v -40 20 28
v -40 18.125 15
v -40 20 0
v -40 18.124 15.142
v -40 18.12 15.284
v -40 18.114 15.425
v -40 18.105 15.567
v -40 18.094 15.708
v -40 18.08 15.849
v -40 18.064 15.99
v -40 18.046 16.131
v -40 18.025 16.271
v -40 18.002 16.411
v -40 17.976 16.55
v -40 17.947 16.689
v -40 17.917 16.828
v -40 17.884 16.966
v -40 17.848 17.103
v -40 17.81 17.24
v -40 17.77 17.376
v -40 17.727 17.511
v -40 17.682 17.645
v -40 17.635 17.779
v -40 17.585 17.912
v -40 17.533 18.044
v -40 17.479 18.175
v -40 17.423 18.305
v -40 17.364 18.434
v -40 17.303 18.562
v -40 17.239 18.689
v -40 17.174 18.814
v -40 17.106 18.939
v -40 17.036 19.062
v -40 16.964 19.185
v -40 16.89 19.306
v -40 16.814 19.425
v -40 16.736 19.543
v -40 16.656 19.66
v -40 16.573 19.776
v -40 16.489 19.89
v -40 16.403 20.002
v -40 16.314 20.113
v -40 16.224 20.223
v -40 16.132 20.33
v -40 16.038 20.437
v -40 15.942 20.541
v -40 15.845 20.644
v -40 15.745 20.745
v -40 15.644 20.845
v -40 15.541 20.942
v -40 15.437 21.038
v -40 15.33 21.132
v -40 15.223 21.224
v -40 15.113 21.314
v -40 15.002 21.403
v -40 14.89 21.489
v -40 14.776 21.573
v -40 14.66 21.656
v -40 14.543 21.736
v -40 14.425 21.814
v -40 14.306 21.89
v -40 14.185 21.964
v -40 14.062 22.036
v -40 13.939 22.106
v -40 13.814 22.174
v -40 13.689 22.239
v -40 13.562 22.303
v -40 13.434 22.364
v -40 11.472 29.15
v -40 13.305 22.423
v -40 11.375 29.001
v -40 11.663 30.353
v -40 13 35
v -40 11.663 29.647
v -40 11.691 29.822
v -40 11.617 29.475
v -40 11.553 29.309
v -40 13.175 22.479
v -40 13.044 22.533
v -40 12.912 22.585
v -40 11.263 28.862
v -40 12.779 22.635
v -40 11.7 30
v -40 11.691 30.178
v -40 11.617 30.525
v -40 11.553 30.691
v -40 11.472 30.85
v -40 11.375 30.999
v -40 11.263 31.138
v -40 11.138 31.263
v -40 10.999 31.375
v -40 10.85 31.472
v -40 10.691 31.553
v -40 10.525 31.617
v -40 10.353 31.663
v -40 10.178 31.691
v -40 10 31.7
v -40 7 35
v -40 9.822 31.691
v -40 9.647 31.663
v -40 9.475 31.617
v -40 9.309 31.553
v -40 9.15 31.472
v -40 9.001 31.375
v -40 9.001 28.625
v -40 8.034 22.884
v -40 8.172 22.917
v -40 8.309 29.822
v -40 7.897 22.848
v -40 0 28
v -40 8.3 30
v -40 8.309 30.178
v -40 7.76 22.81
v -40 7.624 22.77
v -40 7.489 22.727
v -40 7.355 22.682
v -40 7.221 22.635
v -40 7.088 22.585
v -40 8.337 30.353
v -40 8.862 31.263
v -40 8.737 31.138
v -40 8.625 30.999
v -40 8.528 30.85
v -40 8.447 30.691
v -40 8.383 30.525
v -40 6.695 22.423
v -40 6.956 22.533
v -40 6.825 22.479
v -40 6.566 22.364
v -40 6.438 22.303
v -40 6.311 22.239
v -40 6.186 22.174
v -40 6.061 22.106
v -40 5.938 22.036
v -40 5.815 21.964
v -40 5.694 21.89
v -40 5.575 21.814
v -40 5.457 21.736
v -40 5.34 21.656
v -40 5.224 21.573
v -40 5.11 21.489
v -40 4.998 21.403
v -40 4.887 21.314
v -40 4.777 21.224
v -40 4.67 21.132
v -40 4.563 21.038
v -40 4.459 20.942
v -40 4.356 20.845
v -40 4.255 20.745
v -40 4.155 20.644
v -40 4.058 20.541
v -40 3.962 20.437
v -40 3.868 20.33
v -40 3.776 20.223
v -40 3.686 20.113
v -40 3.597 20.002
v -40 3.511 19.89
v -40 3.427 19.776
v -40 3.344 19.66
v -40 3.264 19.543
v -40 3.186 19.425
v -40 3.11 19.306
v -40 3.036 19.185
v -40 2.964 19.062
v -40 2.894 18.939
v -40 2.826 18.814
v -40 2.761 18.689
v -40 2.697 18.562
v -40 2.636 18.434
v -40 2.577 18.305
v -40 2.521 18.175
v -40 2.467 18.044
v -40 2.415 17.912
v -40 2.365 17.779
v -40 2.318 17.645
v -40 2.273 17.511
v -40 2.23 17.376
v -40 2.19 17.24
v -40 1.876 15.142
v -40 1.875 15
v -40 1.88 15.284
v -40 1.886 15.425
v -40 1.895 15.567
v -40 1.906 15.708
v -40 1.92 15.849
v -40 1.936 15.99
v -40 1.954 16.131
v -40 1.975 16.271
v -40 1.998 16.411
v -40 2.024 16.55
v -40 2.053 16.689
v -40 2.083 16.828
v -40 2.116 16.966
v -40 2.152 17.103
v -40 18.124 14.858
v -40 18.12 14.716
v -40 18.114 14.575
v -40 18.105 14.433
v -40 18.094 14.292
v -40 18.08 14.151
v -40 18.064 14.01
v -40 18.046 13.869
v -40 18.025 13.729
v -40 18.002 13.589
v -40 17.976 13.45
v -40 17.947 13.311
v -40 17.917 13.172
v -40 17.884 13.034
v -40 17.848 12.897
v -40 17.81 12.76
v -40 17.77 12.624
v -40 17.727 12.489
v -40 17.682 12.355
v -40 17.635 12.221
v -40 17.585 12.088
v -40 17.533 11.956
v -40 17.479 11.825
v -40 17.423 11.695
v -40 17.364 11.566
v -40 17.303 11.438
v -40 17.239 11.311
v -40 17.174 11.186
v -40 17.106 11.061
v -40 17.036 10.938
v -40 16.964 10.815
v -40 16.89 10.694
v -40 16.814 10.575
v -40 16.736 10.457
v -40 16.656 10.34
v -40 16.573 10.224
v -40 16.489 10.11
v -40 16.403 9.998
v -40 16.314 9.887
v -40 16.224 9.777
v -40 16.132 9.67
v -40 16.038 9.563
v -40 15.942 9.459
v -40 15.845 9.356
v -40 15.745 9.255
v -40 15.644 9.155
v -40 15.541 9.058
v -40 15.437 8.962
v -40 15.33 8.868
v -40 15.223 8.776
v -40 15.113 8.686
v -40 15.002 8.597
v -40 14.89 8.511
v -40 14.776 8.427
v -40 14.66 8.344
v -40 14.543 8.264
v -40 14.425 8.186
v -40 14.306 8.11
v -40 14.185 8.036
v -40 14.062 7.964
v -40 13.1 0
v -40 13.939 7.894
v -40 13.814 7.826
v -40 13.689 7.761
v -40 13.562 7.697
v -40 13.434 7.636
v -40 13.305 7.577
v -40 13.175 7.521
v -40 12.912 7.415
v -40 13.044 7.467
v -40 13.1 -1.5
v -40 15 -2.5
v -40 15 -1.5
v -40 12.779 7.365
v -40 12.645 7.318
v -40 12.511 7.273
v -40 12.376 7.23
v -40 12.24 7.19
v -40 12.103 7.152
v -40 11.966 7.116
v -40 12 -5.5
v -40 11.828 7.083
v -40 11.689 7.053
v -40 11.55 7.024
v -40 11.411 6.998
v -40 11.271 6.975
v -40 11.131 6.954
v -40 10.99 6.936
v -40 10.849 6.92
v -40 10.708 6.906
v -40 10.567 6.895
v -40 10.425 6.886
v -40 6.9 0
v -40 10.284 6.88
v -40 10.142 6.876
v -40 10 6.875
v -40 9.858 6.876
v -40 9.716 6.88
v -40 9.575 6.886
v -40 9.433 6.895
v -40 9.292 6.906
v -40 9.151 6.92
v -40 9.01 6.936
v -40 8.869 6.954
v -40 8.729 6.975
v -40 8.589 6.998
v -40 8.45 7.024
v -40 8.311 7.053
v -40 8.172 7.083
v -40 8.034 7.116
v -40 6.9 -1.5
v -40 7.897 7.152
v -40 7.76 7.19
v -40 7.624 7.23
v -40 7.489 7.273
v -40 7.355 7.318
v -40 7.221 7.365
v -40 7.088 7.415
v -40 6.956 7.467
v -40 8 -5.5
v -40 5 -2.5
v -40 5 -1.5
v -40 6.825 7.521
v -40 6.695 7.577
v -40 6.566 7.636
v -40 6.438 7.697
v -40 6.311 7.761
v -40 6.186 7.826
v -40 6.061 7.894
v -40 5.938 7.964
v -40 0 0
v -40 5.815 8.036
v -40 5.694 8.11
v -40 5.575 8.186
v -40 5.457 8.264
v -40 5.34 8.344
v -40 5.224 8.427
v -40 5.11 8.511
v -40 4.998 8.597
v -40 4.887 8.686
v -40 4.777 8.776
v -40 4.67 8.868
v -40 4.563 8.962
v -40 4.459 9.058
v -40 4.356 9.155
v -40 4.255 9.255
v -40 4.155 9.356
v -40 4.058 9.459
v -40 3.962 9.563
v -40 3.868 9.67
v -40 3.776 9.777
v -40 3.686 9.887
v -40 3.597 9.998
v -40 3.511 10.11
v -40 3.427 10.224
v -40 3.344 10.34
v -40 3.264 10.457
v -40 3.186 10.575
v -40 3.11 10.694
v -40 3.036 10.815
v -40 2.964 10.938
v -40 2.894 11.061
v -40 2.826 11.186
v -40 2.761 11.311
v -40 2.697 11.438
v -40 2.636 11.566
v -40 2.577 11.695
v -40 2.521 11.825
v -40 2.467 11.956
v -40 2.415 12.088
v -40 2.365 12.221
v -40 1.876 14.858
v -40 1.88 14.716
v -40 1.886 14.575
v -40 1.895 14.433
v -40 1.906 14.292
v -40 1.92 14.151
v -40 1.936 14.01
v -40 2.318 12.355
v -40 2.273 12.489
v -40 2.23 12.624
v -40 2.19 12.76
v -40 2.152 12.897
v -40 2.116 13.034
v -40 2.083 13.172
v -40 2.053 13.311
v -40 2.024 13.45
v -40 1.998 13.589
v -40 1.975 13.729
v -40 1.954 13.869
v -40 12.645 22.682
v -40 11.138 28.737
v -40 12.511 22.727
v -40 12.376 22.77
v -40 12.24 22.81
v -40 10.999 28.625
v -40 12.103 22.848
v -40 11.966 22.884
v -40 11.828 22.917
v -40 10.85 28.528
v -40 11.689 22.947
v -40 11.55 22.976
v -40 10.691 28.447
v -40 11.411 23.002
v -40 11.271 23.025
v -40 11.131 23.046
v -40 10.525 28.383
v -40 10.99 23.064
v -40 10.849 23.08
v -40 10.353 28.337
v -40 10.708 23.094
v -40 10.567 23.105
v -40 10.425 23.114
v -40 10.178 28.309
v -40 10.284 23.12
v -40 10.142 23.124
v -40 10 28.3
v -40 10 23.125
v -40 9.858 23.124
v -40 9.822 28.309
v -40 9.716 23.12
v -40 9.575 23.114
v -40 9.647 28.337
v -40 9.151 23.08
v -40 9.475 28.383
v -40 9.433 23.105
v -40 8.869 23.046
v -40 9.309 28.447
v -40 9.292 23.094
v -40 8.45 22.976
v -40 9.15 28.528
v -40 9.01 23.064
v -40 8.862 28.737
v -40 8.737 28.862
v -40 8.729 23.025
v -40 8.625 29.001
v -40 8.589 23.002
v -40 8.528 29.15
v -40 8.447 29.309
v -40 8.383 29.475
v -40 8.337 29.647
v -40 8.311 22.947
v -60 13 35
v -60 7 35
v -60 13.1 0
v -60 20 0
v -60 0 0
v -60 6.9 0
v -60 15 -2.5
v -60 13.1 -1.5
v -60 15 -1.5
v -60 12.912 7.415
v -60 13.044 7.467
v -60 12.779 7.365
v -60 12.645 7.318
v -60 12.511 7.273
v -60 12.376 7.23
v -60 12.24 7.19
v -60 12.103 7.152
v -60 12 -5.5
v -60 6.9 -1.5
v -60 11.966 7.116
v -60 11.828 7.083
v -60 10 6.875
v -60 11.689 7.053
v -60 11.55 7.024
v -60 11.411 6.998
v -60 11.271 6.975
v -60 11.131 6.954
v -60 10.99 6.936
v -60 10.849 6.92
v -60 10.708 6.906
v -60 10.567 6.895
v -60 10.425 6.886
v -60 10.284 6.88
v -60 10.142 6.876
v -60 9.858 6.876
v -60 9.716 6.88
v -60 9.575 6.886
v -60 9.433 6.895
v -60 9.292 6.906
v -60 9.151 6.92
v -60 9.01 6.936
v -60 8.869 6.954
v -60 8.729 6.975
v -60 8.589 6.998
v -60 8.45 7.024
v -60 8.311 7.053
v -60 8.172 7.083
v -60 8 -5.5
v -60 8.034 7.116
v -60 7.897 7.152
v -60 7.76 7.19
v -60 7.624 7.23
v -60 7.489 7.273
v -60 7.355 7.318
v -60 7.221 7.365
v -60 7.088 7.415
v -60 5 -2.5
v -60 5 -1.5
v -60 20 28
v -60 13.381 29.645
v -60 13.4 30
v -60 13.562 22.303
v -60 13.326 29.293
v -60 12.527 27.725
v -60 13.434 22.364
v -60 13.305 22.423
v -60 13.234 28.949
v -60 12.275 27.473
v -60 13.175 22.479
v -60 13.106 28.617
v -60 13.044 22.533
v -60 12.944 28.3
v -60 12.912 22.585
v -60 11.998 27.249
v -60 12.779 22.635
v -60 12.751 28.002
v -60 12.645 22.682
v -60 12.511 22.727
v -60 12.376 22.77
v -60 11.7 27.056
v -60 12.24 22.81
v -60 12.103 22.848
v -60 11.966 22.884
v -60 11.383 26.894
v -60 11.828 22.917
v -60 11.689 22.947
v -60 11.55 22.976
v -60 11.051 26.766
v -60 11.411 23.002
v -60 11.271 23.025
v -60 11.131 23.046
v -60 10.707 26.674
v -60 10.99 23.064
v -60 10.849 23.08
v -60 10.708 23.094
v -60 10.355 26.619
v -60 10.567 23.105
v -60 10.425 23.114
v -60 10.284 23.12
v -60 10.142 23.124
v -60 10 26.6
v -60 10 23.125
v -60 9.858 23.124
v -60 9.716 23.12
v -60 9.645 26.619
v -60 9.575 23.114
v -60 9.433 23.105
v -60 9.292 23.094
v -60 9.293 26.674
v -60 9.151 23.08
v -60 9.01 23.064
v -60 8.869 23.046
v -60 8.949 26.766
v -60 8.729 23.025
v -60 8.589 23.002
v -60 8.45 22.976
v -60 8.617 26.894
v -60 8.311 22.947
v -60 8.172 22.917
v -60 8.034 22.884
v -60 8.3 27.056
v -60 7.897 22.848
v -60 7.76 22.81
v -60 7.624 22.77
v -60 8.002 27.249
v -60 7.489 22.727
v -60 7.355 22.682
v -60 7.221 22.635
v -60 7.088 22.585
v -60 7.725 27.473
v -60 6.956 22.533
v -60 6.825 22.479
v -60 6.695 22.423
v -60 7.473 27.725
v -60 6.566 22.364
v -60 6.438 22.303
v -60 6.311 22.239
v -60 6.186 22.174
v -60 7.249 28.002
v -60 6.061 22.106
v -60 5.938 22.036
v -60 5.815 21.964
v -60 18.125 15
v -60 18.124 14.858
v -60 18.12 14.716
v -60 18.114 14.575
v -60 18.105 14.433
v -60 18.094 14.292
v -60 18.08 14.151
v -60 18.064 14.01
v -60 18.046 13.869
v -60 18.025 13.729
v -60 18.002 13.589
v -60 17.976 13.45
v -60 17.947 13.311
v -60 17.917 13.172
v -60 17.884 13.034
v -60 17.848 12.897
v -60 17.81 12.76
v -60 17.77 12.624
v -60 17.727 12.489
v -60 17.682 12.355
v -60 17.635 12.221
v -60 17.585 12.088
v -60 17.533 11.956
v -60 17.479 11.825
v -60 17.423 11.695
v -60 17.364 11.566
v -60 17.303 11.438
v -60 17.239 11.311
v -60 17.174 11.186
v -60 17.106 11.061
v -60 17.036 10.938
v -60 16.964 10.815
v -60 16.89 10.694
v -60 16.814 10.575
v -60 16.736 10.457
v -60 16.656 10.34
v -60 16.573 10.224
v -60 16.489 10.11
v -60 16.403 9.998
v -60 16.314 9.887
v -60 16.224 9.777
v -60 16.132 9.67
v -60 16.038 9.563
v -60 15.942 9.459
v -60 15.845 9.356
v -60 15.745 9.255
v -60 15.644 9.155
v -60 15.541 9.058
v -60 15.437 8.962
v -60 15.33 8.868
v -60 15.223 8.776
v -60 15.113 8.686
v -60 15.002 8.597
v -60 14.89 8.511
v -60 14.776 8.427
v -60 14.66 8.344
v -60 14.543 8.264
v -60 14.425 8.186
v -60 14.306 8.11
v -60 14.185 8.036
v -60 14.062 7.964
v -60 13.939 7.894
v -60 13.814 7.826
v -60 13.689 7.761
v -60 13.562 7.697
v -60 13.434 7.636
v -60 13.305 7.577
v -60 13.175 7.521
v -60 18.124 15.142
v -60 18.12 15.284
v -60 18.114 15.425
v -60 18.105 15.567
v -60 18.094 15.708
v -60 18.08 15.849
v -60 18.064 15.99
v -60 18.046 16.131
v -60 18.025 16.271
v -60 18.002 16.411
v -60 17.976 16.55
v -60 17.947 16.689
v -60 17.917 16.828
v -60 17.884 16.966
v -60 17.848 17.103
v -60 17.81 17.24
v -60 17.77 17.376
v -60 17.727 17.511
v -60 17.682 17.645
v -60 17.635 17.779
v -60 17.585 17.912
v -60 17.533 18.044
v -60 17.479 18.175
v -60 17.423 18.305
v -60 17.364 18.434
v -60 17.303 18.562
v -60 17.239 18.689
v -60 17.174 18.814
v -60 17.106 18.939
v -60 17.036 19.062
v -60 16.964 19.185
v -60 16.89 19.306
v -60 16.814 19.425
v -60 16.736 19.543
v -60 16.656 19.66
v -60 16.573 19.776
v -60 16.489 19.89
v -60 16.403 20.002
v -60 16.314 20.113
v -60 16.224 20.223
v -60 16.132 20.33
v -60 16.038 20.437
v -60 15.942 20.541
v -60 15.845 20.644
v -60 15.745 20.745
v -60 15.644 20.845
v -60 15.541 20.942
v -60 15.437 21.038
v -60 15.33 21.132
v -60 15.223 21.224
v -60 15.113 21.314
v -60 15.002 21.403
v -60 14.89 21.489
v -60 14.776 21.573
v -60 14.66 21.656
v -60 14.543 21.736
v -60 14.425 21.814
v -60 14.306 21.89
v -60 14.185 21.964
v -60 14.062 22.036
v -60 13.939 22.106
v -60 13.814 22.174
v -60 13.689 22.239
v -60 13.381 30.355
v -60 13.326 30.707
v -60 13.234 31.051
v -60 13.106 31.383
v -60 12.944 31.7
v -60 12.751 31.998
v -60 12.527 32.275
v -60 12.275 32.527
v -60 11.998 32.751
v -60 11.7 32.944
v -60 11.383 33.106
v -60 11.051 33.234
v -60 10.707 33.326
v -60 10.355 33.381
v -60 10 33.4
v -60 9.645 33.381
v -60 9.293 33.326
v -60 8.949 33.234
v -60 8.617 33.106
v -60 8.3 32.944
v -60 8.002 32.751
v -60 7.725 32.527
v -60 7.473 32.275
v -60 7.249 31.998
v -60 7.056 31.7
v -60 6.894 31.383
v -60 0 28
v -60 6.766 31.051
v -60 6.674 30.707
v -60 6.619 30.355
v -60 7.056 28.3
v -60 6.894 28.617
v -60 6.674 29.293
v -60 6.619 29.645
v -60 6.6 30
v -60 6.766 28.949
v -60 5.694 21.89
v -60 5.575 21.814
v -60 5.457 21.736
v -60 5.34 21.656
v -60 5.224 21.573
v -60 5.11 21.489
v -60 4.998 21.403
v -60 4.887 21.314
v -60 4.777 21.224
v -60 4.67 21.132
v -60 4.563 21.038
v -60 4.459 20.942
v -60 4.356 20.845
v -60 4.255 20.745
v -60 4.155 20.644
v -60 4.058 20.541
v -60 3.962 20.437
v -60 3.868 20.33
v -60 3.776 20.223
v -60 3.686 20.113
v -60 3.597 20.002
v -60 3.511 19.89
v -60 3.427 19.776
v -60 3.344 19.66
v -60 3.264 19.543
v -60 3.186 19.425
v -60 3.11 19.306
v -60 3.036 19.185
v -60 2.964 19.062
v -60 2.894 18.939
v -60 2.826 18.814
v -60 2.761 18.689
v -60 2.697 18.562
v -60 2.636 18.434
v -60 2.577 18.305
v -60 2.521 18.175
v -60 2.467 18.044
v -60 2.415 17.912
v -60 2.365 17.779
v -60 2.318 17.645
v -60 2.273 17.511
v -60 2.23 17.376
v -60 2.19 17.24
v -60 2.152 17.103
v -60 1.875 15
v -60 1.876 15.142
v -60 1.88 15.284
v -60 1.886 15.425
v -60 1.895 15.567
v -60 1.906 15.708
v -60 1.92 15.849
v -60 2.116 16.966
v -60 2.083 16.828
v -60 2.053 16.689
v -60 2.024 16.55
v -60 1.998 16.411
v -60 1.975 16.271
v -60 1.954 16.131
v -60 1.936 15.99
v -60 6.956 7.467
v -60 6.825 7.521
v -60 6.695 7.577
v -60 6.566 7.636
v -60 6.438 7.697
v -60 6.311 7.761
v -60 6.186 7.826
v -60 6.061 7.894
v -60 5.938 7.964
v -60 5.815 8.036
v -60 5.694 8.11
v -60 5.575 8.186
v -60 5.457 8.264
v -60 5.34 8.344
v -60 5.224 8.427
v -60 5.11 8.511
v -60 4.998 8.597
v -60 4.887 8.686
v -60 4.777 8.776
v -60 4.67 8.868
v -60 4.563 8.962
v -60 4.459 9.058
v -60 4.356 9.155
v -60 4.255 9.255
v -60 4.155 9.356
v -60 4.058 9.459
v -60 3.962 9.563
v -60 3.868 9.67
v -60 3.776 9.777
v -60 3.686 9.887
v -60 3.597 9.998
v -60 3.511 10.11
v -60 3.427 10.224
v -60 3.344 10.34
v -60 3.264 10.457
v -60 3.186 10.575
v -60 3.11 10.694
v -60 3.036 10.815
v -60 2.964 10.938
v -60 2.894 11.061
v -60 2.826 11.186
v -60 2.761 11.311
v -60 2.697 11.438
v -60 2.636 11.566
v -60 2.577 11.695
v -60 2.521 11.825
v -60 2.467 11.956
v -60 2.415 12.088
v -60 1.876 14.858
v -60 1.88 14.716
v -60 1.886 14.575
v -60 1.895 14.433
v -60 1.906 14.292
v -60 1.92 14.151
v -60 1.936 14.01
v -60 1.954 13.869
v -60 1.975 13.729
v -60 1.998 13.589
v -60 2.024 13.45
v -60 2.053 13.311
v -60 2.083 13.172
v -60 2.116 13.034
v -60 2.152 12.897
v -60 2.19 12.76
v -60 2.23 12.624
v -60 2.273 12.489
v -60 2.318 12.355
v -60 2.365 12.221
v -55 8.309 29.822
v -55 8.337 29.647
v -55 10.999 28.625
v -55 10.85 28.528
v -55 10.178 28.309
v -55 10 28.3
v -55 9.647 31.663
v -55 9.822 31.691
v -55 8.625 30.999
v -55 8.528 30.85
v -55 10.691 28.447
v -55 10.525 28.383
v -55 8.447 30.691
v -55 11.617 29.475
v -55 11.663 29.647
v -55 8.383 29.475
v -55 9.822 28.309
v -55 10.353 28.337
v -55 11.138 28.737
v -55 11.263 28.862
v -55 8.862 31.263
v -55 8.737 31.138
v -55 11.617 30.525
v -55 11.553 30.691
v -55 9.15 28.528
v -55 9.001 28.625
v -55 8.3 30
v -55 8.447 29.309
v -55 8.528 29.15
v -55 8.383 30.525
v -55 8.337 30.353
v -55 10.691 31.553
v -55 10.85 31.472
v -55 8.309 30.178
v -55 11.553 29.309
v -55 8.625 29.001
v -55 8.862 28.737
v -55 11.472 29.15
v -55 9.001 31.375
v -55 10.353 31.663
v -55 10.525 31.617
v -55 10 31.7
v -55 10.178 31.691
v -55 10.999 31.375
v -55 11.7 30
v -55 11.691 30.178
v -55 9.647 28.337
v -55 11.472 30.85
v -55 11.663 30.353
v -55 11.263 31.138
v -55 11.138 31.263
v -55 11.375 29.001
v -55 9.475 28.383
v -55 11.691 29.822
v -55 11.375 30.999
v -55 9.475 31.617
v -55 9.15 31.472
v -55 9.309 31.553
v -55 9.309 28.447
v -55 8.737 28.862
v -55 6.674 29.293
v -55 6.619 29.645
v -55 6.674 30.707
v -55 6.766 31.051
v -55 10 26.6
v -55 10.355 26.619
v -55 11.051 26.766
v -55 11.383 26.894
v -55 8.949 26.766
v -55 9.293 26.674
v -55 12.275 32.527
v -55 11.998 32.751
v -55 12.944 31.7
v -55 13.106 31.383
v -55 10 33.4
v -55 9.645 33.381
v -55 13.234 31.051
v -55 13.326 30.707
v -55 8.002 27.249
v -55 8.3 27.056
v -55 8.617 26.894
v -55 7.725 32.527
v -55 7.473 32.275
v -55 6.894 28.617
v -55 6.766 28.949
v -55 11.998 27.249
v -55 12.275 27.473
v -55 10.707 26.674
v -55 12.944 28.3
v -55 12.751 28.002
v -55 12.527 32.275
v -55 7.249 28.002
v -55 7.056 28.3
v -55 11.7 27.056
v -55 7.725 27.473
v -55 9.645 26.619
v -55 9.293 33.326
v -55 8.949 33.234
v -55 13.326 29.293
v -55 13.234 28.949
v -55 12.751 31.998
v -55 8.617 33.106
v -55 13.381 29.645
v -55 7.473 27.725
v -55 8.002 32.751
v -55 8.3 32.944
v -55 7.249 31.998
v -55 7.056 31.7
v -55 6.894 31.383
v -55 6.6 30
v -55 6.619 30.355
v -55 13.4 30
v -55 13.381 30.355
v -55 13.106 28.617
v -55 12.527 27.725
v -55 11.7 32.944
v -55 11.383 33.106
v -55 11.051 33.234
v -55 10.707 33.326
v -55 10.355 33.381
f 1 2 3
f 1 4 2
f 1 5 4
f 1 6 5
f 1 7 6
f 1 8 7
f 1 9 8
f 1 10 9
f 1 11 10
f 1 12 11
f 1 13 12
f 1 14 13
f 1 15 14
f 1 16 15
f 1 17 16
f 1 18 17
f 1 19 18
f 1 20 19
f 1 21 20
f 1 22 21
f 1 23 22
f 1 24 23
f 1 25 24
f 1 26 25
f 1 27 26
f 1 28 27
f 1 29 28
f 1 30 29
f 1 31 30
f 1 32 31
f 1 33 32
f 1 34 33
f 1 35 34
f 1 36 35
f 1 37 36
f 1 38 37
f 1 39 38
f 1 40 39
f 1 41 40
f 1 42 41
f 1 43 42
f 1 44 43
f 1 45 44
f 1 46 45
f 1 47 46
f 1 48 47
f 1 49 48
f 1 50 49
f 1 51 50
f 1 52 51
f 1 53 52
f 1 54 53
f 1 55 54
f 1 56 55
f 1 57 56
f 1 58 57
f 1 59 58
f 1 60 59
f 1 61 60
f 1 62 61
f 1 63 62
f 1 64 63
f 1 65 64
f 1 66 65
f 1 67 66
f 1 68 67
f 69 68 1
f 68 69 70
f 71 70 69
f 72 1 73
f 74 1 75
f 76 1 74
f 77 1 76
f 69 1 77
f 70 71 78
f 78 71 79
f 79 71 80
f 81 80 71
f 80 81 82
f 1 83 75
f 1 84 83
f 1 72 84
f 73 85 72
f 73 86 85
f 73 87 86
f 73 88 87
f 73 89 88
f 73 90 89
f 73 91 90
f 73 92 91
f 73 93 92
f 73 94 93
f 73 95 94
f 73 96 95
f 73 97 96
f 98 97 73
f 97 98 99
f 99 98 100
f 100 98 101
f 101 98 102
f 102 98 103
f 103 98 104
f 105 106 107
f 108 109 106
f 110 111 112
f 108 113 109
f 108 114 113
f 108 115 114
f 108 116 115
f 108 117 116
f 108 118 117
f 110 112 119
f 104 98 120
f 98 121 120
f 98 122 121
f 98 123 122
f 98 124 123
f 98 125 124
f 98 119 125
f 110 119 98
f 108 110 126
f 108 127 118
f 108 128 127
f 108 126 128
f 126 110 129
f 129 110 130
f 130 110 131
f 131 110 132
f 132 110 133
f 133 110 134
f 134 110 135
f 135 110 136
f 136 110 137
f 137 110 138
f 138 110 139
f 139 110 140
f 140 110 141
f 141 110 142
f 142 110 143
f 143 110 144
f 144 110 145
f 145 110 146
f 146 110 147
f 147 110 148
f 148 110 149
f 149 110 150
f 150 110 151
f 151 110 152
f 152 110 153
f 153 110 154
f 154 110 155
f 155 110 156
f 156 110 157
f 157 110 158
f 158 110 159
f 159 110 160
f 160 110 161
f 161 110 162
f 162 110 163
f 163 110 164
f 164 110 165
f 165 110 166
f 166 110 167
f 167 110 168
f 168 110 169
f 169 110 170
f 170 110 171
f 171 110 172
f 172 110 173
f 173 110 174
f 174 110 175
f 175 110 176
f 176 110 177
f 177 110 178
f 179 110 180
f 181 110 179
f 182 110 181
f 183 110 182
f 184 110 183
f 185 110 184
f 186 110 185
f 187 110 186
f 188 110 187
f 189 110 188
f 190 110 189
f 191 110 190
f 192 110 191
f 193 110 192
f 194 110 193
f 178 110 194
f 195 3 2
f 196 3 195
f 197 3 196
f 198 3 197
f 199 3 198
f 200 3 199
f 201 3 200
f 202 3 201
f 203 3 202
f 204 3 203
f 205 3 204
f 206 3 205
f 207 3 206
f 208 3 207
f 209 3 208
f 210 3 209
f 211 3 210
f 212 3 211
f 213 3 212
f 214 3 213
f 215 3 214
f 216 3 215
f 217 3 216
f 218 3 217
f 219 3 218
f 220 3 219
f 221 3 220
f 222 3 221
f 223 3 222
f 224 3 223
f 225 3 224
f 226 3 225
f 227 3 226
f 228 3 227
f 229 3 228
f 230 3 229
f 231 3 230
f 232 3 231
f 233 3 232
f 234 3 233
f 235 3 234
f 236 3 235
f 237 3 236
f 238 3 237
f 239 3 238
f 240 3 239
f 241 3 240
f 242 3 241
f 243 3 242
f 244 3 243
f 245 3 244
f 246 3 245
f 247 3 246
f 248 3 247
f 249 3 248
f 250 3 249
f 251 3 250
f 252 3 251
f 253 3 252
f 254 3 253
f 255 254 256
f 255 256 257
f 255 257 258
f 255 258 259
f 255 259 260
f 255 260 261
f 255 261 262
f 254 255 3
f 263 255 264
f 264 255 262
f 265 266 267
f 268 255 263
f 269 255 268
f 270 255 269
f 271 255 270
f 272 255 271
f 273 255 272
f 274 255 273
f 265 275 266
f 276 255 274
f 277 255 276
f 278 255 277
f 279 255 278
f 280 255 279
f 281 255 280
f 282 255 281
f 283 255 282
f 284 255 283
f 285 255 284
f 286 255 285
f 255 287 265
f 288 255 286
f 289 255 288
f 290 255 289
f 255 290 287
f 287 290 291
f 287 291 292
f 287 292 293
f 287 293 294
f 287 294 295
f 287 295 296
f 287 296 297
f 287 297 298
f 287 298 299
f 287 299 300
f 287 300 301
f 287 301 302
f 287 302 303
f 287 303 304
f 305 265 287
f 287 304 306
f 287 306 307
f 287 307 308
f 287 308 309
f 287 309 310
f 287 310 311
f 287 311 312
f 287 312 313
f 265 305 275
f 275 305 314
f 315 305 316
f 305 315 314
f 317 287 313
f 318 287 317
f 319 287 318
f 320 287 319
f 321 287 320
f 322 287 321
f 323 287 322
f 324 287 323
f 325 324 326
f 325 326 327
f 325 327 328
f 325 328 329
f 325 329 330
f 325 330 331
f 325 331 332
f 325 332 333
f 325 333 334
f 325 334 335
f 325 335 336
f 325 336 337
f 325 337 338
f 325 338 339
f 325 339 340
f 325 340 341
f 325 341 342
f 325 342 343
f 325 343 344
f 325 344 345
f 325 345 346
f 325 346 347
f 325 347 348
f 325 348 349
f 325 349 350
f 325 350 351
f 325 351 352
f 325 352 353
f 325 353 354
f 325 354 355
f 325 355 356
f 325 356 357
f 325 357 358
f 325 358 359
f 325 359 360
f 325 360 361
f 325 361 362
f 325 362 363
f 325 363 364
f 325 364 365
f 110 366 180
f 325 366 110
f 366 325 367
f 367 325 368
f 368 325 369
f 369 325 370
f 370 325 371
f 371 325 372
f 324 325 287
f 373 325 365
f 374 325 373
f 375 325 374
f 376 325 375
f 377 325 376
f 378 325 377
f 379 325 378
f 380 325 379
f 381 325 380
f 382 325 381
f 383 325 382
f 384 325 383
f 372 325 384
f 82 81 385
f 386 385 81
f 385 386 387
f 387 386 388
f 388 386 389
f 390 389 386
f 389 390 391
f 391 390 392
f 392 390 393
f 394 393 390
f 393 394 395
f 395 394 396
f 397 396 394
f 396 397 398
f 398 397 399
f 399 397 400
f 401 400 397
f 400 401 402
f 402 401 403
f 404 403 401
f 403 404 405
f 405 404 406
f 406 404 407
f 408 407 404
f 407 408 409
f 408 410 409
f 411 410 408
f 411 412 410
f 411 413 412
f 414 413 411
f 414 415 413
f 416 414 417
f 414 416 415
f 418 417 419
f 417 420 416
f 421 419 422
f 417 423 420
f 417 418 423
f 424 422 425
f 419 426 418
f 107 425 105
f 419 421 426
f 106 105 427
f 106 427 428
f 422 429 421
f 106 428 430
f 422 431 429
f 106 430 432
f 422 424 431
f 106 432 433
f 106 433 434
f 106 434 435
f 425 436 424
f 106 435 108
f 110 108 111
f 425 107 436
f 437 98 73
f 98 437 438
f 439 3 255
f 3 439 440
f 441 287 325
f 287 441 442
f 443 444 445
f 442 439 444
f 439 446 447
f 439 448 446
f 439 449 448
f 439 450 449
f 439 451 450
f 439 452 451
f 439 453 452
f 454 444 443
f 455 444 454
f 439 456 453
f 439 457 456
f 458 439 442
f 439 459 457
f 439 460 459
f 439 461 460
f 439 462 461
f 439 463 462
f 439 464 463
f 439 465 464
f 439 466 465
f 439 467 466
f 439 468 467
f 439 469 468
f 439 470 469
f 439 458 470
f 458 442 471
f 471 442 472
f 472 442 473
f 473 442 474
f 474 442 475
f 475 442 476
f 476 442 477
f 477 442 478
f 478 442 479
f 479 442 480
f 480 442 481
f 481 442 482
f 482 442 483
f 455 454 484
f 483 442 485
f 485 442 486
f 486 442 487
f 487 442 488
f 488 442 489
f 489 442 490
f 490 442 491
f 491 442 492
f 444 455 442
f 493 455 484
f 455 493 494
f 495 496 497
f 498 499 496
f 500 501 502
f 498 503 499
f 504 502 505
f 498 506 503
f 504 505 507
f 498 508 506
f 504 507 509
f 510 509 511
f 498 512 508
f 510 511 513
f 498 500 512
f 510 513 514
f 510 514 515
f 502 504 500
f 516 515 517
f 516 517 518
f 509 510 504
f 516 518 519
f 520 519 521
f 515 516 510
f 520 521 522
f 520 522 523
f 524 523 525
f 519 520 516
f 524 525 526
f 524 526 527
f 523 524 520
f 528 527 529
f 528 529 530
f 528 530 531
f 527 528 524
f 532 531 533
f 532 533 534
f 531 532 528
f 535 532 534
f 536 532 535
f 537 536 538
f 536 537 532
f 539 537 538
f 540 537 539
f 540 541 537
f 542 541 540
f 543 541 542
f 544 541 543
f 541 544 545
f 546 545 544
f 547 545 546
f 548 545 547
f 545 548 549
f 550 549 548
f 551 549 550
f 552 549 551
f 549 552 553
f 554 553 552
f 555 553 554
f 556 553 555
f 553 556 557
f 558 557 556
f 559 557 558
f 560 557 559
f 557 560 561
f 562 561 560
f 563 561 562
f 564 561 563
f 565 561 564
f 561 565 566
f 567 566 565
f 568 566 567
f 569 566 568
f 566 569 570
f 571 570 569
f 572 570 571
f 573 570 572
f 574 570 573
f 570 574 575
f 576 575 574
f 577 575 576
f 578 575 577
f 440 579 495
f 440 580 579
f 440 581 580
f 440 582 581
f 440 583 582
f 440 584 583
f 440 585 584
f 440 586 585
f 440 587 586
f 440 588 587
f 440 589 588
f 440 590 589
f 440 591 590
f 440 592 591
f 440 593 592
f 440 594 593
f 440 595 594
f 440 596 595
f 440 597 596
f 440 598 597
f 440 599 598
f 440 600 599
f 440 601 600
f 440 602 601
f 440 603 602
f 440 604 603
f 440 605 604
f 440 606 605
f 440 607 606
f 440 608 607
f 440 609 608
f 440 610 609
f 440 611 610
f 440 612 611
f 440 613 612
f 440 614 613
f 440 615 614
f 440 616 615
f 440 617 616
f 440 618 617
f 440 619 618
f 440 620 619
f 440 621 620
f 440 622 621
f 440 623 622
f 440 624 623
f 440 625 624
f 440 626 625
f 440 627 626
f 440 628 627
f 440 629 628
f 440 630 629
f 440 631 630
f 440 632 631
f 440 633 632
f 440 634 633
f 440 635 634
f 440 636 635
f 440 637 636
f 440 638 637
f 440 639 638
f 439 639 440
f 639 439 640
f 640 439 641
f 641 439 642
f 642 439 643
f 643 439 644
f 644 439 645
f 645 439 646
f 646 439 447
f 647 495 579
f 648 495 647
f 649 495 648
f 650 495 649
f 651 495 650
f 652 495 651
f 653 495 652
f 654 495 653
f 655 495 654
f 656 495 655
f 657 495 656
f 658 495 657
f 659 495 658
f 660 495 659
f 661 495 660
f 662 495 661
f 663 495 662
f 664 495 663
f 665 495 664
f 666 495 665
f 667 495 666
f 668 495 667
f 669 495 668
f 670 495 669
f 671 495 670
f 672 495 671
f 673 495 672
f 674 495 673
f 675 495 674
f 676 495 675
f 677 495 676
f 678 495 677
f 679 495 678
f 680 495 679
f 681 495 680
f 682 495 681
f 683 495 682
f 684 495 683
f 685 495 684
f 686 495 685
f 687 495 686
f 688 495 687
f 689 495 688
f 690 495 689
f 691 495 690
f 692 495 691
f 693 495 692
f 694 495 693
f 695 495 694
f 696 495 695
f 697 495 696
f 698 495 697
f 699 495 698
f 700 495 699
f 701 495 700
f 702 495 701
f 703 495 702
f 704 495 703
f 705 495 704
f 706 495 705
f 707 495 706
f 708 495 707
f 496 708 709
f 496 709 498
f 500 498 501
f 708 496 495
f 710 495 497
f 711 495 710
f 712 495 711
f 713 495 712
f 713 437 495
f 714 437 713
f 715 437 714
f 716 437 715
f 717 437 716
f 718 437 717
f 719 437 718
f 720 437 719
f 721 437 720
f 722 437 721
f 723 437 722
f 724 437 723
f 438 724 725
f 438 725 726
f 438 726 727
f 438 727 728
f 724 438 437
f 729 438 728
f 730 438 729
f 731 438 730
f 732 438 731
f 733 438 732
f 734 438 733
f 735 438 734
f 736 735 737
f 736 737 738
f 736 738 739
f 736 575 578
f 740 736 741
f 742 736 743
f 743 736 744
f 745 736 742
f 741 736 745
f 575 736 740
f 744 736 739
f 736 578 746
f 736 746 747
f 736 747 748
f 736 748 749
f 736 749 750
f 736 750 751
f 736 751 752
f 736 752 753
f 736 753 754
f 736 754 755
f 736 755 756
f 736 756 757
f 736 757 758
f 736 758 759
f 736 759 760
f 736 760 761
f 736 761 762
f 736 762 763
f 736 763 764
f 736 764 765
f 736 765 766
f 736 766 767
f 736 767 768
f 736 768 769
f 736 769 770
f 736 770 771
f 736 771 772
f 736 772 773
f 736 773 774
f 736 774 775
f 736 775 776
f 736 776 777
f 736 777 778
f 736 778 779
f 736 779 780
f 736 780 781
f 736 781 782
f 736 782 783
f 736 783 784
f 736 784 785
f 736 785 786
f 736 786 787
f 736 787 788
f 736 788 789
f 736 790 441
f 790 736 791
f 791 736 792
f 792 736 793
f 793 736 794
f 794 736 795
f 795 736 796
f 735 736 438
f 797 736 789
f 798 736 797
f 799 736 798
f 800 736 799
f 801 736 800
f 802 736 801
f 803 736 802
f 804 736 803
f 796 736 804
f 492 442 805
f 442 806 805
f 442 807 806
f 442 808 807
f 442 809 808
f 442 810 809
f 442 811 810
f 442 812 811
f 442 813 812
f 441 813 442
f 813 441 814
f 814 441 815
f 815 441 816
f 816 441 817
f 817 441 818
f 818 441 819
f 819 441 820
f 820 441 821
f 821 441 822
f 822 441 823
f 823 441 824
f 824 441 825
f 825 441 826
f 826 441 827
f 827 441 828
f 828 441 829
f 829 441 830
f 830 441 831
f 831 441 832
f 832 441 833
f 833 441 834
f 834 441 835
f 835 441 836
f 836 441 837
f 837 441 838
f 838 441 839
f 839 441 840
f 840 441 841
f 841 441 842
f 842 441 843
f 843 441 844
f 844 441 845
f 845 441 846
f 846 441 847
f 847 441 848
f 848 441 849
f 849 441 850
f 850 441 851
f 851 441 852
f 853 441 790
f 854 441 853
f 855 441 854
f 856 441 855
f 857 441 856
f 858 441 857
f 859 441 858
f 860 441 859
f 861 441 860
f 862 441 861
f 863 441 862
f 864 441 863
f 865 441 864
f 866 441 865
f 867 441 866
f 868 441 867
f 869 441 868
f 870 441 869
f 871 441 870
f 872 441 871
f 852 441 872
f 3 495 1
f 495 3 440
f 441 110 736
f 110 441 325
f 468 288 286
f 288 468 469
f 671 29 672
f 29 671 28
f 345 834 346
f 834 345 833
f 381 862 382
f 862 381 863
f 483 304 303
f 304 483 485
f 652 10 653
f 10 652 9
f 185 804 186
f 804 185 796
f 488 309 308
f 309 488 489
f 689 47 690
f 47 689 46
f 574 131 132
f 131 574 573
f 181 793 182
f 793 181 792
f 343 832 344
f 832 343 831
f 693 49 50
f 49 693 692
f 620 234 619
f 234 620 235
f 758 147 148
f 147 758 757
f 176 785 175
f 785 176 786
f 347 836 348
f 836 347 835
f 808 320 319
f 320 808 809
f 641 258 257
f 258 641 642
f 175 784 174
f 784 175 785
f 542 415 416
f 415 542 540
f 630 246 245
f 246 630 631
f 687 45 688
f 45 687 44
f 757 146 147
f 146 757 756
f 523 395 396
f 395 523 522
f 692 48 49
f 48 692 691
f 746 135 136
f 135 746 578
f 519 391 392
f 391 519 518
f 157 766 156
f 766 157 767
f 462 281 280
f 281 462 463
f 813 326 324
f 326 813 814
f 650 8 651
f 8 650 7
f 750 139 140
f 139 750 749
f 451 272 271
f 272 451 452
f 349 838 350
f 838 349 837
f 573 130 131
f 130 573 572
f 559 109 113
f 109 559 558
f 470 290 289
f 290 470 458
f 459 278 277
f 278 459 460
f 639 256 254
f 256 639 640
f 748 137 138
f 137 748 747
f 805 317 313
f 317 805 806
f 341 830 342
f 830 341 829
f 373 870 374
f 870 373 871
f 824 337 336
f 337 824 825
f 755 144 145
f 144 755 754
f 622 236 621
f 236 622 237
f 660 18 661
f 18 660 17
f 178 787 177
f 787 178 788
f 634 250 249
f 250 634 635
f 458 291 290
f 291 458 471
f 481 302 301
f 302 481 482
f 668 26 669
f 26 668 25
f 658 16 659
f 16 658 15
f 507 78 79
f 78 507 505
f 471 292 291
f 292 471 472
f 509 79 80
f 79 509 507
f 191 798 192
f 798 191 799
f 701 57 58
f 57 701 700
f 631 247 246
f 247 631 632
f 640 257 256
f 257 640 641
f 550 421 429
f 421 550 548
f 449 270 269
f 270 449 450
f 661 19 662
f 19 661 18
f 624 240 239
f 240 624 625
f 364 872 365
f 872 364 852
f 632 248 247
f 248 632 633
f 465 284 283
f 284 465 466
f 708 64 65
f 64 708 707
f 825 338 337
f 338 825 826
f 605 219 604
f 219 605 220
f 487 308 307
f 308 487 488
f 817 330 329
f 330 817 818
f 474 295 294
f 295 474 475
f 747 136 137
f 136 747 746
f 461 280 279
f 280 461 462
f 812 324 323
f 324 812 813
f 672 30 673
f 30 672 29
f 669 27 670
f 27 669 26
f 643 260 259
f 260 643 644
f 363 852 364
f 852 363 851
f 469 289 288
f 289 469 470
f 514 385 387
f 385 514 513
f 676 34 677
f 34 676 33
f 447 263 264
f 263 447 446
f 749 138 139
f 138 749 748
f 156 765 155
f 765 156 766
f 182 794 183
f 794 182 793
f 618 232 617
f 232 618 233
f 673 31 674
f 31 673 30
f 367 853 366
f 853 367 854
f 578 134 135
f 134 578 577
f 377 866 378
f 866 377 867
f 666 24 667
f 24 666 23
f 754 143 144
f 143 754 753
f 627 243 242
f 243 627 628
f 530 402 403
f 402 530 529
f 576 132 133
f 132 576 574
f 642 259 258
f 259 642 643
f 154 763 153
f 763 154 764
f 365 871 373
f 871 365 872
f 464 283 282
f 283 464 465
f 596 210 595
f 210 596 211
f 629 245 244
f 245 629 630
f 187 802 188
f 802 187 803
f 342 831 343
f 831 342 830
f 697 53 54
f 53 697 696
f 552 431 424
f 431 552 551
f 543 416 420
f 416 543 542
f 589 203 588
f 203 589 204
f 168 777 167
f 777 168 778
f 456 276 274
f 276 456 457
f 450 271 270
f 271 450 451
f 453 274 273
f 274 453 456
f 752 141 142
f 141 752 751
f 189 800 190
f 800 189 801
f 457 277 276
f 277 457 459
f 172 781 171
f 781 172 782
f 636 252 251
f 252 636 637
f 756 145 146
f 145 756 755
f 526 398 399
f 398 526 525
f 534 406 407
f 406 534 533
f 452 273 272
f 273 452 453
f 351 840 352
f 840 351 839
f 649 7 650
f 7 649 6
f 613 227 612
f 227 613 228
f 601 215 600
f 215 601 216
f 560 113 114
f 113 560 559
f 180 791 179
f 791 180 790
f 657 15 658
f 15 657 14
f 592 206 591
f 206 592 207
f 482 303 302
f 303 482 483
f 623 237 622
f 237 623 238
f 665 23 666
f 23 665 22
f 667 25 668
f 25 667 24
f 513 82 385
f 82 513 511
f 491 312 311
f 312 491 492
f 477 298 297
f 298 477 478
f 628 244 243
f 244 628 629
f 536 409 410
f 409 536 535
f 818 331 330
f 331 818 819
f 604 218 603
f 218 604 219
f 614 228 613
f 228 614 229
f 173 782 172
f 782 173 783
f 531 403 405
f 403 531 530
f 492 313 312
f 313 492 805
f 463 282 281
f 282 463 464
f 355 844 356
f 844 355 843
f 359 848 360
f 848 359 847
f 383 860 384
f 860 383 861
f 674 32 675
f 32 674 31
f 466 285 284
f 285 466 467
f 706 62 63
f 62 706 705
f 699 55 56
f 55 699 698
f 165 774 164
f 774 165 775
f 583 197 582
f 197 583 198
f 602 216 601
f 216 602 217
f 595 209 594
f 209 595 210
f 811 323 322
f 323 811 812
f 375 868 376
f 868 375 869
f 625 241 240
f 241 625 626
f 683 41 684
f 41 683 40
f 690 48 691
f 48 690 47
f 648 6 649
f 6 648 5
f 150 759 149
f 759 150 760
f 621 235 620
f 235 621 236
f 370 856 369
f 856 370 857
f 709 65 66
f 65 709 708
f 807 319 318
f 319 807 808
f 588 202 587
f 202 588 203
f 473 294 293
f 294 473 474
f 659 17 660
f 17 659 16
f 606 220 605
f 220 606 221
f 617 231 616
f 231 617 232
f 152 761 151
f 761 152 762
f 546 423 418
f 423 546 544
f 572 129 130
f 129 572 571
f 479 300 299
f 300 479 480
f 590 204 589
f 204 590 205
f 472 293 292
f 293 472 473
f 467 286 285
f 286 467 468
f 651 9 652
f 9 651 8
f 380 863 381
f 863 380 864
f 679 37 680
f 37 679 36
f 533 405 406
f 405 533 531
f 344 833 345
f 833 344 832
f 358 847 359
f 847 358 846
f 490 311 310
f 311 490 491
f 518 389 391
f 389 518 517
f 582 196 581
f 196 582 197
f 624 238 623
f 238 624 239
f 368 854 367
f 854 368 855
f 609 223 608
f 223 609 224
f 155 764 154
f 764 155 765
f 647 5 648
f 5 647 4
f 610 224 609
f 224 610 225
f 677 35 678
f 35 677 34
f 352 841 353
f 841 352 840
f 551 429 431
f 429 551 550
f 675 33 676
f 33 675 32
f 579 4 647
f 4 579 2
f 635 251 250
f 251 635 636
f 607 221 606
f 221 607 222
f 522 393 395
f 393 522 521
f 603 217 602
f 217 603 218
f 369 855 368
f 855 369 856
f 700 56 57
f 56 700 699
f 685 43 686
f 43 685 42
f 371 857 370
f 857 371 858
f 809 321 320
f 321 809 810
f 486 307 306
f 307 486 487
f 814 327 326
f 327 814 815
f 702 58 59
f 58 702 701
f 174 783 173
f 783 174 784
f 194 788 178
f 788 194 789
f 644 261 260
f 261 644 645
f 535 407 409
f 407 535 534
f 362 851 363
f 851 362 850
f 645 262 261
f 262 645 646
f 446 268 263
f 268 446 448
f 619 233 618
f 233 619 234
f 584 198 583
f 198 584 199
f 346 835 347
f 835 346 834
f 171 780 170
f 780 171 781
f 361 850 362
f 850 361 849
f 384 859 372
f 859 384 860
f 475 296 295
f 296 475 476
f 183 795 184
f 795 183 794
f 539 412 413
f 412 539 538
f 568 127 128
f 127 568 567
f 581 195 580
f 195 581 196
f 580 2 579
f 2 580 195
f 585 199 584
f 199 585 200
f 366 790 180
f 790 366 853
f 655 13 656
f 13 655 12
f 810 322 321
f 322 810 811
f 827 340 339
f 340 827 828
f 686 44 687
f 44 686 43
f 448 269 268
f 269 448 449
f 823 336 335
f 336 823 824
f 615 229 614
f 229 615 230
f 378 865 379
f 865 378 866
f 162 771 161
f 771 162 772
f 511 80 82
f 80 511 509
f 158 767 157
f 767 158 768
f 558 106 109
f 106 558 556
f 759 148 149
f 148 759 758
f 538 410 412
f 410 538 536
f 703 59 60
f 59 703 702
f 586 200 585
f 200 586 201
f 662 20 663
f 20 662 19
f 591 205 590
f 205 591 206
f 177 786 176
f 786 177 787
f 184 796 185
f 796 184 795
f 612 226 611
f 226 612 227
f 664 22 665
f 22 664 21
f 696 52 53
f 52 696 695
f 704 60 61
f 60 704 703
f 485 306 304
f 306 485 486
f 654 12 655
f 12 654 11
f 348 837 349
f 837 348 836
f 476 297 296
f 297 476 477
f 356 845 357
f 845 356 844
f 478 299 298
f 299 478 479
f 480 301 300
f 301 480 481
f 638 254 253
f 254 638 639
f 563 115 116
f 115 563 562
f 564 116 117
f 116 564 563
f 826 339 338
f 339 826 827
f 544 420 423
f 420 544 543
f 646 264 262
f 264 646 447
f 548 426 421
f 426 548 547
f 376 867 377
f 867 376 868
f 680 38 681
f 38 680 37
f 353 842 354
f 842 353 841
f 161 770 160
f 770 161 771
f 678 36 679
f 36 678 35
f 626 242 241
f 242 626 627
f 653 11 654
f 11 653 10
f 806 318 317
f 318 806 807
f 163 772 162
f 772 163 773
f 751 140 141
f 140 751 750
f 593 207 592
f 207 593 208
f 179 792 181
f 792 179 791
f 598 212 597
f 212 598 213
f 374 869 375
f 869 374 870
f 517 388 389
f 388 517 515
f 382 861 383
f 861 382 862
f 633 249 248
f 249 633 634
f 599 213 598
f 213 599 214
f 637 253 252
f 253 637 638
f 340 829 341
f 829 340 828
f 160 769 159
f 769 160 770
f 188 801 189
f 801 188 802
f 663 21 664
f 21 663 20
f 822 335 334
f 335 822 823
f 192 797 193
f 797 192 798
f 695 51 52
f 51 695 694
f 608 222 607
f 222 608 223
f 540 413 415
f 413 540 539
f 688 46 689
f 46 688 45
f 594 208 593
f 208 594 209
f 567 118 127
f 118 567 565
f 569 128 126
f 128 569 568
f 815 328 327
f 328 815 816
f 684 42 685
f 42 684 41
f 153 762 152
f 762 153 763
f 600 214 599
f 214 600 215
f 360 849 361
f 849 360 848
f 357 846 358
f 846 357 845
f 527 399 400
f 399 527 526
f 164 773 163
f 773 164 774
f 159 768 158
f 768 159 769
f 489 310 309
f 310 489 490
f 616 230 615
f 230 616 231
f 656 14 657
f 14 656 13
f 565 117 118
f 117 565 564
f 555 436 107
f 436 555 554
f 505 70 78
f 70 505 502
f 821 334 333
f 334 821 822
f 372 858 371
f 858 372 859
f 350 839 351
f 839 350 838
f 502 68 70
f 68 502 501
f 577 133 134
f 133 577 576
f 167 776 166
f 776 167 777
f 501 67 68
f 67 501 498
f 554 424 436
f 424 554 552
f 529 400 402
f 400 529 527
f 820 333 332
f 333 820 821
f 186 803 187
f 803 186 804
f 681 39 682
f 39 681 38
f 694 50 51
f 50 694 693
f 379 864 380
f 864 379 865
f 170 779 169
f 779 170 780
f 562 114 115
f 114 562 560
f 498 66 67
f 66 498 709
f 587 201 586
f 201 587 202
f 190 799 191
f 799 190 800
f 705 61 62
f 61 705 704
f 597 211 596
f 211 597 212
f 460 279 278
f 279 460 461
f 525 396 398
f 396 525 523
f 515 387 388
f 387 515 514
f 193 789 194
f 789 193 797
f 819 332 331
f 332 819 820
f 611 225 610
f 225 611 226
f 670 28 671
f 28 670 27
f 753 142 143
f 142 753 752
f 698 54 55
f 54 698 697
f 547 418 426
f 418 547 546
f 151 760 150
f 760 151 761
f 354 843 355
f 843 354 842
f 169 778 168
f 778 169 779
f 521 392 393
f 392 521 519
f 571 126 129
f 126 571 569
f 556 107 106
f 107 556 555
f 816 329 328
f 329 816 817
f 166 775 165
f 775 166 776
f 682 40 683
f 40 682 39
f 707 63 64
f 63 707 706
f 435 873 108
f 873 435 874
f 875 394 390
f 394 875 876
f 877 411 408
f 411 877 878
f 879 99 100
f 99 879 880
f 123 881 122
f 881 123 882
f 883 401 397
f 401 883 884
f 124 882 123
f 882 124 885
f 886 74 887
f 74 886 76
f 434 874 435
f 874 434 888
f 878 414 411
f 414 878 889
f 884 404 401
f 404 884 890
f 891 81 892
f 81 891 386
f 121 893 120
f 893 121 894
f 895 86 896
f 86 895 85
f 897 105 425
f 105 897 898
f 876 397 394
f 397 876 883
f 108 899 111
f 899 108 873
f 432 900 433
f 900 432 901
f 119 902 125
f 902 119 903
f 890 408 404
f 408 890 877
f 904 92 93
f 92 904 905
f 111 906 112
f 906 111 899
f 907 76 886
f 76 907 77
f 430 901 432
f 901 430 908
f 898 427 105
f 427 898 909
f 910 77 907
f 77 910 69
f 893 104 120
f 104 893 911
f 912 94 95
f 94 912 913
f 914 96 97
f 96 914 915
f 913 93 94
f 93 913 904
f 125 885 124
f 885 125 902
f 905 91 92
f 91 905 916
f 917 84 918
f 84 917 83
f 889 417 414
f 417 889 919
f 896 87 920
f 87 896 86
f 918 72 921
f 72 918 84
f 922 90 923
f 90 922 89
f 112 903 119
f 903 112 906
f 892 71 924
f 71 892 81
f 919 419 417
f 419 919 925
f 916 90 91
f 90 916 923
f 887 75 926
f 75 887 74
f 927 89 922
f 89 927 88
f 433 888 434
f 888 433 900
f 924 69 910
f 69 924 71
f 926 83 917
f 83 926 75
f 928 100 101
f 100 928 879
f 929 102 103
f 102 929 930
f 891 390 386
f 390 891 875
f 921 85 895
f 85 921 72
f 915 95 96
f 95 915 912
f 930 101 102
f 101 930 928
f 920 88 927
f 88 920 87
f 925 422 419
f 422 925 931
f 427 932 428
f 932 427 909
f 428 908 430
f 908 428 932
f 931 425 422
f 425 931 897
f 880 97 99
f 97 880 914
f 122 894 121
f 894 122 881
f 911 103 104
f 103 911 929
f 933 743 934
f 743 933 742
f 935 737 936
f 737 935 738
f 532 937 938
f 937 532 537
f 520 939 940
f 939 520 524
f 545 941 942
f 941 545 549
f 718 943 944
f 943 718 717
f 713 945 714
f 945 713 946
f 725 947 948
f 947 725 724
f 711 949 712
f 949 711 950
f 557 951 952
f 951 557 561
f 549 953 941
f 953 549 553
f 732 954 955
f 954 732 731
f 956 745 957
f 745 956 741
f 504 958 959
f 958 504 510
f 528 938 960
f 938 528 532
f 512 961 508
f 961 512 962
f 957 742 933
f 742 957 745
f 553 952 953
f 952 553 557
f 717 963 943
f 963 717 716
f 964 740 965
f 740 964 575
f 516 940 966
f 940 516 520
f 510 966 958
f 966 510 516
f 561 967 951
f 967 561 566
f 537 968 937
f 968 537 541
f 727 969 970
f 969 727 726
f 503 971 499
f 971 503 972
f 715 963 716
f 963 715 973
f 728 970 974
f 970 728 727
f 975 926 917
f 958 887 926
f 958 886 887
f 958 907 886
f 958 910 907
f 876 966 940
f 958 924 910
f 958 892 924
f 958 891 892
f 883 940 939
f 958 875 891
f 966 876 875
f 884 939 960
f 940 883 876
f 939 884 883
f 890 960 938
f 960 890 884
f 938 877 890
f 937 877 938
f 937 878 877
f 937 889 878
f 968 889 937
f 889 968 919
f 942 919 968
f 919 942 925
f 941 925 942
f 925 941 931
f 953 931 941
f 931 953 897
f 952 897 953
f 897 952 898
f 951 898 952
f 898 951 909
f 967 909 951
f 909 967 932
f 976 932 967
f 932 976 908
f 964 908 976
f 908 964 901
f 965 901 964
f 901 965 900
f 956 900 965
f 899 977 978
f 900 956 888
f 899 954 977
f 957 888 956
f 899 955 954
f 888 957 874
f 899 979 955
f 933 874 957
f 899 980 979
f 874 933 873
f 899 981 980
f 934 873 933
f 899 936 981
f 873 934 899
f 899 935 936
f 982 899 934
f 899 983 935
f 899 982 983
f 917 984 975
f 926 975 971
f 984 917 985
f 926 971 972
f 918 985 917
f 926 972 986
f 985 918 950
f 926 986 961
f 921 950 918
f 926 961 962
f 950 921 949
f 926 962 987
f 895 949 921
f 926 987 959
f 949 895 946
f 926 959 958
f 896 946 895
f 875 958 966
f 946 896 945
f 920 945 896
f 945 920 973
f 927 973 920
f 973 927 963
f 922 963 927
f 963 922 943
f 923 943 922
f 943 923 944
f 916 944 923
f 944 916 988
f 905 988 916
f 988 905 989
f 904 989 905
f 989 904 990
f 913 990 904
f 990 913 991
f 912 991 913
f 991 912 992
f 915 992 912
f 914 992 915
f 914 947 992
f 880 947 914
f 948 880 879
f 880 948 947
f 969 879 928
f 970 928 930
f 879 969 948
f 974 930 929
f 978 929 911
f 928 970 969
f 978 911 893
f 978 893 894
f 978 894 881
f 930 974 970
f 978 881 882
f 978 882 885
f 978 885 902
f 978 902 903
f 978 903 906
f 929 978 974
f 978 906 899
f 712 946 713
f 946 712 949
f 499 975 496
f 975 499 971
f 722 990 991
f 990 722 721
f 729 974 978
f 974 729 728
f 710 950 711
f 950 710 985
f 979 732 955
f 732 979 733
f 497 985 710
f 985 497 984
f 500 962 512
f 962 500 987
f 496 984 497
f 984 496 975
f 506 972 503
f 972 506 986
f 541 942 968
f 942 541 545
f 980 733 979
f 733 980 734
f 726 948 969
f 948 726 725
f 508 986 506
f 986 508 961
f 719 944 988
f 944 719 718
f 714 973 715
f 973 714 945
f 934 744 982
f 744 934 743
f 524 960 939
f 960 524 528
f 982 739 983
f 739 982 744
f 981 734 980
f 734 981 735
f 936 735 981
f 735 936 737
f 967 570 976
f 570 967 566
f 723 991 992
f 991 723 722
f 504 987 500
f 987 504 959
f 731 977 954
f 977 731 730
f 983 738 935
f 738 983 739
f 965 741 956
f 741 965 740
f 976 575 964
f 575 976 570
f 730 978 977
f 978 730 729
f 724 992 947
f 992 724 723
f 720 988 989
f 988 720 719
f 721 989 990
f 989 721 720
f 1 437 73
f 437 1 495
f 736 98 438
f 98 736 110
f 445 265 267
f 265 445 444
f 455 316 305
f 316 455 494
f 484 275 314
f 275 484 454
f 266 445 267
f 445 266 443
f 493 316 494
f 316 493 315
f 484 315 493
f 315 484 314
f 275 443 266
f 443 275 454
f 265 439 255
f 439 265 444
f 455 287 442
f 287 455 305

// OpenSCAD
// Support for 16mm rod

// translate([-30, 0, 0]) closed();
// translate([-60, 0, 0]) closed_alt();
translate([-60, 0, 0]) closed_alt2();
// support();

module closed() {
	difference() {
		union() {
			cube([20, 20, 15]);
			translate([0, 10, 15]) rotate([0, 90, 0]) cylinder(r=10, h=20, $fn=360);
		}
		translate([-0.1, 10, 15]) rotate([0, 90, 0]) cylinder(r=8.125, h=20.2, $fn=360);
	}
	translate([10, 10, -1]) cube([20, 6.2, 2], center=true);
	difference() {
		translate([10, 10, -3.5]) cube([20, 10, 4], center=true);
		translate([-0.1, 5, -2.5]) rotate([-135, 0, 0]) cube([20.2, 10, 10]);
		translate([-0.1, 15, -2.5]) rotate([-135, 0, 0]) cube([20.2, 10, 10]);
	}
}

module closed_alt() {
	difference() {
		union() {
			cube([20, 20, 35]);
			// translate([10, 0, 30]) rotate([-90, 0, 0]) cylinder(r=10, h=20, $fn=60);
		}
		translate([-0.1, 10, 15]) rotate([0, 90, 0]) cylinder(r=8.125, h=20.2, $fn=360);
		translate([10, -0.1, 30]) rotate([-90, 0, 0]) cylinder(r=1.5+0.2, h=20.2, $fn=60);
		translate([10, -0.1, 30]) rotate([-90, 0, 0]) cylinder(r=3+0.4, h=5.1, $fn=60);
		// remove excess
		translate([11, -0.1, 37]) rotate([0, 45, 0]) cube([20, 20.2, 20]);
		translate([9, -0.1, 37]) rotate([0, -135, 0]) cube([20, 20.2, 20]);
	}
	translate([10, 10, -1]) cube([20, 6.2, 2], center=true);
	difference() {
		translate([10, 10, -3.5]) cube([20, 10, 4], center=true);
		translate([-0.1, 5, -2.5]) rotate([-135, 0, 0]) cube([20.2, 10, 10]);
		translate([-0.1, 15, -2.5]) rotate([-135, 0, 0]) cube([20.2, 10, 10]);
	}
}

module closed_alt2() {
	difference() {
		union() {
			cube([20, 20, 35]);
			// translate([10, 0, 30]) rotate([-90, 0, 0]) cylinder(r=10, h=20, $fn=60);
		}
		translate([-0.1, 10, 15]) rotate([0, 90, 0]) cylinder(r=8.125, h=20.2, $fn=360);
		translate([-0.1, 10, 30]) rotate([0, 90, 0]) cylinder(r=1.5+0.2, h=20.2, $fn=60);
		translate([-0.1, 10, 30]) rotate([0, 90, 0]) cylinder(r=3+0.4, h=5.1, $fn=60);
		// remove excess
		translate([-0.1, 11, 37]) rotate([-45, 0, 0]) cube([20.2, 20.2, 20]);
		translate([-0.1, 9, 37]) rotate([135, 0, 0]) cube([20.2, 20.2, 20]);
	}
	translate([10, 10, -1]) cube([20, 6.2, 2], center=true);
	difference() {
		translate([10, 10, -3.5]) cube([20, 10, 4], center=true);
		translate([-0.1, 5, -2.5]) rotate([-135, 0, 0]) cube([20.2, 10, 10]);
		translate([-0.1, 15, -2.5]) rotate([-135, 0, 0]) cube([20.2, 10, 10]);
	}
}

module support() {
	difference() {
		translate([0, 5, 0]) cube([15, 10, 20]);
		translate([-0.1, 10, 15]) rotate([0, 90, 0]) cylinder(r=8.125, h=20.2, $fn=360);
	}
	translate([7.5, 10, -1]) cube([15, 6.2, 2], center=true);
	difference() {
		translate([7.5, 10, -3.5]) cube([15, 12, 4], center=true);
		translate([-0.1, 4, -2.5]) rotate([-135, 0, 0]) cube([20.2, 10, 10]);
		translate([-0.1, 16, -2.5]) rotate([-135, 0, 0]) cube([20.2, 10, 10]);
	}
}
